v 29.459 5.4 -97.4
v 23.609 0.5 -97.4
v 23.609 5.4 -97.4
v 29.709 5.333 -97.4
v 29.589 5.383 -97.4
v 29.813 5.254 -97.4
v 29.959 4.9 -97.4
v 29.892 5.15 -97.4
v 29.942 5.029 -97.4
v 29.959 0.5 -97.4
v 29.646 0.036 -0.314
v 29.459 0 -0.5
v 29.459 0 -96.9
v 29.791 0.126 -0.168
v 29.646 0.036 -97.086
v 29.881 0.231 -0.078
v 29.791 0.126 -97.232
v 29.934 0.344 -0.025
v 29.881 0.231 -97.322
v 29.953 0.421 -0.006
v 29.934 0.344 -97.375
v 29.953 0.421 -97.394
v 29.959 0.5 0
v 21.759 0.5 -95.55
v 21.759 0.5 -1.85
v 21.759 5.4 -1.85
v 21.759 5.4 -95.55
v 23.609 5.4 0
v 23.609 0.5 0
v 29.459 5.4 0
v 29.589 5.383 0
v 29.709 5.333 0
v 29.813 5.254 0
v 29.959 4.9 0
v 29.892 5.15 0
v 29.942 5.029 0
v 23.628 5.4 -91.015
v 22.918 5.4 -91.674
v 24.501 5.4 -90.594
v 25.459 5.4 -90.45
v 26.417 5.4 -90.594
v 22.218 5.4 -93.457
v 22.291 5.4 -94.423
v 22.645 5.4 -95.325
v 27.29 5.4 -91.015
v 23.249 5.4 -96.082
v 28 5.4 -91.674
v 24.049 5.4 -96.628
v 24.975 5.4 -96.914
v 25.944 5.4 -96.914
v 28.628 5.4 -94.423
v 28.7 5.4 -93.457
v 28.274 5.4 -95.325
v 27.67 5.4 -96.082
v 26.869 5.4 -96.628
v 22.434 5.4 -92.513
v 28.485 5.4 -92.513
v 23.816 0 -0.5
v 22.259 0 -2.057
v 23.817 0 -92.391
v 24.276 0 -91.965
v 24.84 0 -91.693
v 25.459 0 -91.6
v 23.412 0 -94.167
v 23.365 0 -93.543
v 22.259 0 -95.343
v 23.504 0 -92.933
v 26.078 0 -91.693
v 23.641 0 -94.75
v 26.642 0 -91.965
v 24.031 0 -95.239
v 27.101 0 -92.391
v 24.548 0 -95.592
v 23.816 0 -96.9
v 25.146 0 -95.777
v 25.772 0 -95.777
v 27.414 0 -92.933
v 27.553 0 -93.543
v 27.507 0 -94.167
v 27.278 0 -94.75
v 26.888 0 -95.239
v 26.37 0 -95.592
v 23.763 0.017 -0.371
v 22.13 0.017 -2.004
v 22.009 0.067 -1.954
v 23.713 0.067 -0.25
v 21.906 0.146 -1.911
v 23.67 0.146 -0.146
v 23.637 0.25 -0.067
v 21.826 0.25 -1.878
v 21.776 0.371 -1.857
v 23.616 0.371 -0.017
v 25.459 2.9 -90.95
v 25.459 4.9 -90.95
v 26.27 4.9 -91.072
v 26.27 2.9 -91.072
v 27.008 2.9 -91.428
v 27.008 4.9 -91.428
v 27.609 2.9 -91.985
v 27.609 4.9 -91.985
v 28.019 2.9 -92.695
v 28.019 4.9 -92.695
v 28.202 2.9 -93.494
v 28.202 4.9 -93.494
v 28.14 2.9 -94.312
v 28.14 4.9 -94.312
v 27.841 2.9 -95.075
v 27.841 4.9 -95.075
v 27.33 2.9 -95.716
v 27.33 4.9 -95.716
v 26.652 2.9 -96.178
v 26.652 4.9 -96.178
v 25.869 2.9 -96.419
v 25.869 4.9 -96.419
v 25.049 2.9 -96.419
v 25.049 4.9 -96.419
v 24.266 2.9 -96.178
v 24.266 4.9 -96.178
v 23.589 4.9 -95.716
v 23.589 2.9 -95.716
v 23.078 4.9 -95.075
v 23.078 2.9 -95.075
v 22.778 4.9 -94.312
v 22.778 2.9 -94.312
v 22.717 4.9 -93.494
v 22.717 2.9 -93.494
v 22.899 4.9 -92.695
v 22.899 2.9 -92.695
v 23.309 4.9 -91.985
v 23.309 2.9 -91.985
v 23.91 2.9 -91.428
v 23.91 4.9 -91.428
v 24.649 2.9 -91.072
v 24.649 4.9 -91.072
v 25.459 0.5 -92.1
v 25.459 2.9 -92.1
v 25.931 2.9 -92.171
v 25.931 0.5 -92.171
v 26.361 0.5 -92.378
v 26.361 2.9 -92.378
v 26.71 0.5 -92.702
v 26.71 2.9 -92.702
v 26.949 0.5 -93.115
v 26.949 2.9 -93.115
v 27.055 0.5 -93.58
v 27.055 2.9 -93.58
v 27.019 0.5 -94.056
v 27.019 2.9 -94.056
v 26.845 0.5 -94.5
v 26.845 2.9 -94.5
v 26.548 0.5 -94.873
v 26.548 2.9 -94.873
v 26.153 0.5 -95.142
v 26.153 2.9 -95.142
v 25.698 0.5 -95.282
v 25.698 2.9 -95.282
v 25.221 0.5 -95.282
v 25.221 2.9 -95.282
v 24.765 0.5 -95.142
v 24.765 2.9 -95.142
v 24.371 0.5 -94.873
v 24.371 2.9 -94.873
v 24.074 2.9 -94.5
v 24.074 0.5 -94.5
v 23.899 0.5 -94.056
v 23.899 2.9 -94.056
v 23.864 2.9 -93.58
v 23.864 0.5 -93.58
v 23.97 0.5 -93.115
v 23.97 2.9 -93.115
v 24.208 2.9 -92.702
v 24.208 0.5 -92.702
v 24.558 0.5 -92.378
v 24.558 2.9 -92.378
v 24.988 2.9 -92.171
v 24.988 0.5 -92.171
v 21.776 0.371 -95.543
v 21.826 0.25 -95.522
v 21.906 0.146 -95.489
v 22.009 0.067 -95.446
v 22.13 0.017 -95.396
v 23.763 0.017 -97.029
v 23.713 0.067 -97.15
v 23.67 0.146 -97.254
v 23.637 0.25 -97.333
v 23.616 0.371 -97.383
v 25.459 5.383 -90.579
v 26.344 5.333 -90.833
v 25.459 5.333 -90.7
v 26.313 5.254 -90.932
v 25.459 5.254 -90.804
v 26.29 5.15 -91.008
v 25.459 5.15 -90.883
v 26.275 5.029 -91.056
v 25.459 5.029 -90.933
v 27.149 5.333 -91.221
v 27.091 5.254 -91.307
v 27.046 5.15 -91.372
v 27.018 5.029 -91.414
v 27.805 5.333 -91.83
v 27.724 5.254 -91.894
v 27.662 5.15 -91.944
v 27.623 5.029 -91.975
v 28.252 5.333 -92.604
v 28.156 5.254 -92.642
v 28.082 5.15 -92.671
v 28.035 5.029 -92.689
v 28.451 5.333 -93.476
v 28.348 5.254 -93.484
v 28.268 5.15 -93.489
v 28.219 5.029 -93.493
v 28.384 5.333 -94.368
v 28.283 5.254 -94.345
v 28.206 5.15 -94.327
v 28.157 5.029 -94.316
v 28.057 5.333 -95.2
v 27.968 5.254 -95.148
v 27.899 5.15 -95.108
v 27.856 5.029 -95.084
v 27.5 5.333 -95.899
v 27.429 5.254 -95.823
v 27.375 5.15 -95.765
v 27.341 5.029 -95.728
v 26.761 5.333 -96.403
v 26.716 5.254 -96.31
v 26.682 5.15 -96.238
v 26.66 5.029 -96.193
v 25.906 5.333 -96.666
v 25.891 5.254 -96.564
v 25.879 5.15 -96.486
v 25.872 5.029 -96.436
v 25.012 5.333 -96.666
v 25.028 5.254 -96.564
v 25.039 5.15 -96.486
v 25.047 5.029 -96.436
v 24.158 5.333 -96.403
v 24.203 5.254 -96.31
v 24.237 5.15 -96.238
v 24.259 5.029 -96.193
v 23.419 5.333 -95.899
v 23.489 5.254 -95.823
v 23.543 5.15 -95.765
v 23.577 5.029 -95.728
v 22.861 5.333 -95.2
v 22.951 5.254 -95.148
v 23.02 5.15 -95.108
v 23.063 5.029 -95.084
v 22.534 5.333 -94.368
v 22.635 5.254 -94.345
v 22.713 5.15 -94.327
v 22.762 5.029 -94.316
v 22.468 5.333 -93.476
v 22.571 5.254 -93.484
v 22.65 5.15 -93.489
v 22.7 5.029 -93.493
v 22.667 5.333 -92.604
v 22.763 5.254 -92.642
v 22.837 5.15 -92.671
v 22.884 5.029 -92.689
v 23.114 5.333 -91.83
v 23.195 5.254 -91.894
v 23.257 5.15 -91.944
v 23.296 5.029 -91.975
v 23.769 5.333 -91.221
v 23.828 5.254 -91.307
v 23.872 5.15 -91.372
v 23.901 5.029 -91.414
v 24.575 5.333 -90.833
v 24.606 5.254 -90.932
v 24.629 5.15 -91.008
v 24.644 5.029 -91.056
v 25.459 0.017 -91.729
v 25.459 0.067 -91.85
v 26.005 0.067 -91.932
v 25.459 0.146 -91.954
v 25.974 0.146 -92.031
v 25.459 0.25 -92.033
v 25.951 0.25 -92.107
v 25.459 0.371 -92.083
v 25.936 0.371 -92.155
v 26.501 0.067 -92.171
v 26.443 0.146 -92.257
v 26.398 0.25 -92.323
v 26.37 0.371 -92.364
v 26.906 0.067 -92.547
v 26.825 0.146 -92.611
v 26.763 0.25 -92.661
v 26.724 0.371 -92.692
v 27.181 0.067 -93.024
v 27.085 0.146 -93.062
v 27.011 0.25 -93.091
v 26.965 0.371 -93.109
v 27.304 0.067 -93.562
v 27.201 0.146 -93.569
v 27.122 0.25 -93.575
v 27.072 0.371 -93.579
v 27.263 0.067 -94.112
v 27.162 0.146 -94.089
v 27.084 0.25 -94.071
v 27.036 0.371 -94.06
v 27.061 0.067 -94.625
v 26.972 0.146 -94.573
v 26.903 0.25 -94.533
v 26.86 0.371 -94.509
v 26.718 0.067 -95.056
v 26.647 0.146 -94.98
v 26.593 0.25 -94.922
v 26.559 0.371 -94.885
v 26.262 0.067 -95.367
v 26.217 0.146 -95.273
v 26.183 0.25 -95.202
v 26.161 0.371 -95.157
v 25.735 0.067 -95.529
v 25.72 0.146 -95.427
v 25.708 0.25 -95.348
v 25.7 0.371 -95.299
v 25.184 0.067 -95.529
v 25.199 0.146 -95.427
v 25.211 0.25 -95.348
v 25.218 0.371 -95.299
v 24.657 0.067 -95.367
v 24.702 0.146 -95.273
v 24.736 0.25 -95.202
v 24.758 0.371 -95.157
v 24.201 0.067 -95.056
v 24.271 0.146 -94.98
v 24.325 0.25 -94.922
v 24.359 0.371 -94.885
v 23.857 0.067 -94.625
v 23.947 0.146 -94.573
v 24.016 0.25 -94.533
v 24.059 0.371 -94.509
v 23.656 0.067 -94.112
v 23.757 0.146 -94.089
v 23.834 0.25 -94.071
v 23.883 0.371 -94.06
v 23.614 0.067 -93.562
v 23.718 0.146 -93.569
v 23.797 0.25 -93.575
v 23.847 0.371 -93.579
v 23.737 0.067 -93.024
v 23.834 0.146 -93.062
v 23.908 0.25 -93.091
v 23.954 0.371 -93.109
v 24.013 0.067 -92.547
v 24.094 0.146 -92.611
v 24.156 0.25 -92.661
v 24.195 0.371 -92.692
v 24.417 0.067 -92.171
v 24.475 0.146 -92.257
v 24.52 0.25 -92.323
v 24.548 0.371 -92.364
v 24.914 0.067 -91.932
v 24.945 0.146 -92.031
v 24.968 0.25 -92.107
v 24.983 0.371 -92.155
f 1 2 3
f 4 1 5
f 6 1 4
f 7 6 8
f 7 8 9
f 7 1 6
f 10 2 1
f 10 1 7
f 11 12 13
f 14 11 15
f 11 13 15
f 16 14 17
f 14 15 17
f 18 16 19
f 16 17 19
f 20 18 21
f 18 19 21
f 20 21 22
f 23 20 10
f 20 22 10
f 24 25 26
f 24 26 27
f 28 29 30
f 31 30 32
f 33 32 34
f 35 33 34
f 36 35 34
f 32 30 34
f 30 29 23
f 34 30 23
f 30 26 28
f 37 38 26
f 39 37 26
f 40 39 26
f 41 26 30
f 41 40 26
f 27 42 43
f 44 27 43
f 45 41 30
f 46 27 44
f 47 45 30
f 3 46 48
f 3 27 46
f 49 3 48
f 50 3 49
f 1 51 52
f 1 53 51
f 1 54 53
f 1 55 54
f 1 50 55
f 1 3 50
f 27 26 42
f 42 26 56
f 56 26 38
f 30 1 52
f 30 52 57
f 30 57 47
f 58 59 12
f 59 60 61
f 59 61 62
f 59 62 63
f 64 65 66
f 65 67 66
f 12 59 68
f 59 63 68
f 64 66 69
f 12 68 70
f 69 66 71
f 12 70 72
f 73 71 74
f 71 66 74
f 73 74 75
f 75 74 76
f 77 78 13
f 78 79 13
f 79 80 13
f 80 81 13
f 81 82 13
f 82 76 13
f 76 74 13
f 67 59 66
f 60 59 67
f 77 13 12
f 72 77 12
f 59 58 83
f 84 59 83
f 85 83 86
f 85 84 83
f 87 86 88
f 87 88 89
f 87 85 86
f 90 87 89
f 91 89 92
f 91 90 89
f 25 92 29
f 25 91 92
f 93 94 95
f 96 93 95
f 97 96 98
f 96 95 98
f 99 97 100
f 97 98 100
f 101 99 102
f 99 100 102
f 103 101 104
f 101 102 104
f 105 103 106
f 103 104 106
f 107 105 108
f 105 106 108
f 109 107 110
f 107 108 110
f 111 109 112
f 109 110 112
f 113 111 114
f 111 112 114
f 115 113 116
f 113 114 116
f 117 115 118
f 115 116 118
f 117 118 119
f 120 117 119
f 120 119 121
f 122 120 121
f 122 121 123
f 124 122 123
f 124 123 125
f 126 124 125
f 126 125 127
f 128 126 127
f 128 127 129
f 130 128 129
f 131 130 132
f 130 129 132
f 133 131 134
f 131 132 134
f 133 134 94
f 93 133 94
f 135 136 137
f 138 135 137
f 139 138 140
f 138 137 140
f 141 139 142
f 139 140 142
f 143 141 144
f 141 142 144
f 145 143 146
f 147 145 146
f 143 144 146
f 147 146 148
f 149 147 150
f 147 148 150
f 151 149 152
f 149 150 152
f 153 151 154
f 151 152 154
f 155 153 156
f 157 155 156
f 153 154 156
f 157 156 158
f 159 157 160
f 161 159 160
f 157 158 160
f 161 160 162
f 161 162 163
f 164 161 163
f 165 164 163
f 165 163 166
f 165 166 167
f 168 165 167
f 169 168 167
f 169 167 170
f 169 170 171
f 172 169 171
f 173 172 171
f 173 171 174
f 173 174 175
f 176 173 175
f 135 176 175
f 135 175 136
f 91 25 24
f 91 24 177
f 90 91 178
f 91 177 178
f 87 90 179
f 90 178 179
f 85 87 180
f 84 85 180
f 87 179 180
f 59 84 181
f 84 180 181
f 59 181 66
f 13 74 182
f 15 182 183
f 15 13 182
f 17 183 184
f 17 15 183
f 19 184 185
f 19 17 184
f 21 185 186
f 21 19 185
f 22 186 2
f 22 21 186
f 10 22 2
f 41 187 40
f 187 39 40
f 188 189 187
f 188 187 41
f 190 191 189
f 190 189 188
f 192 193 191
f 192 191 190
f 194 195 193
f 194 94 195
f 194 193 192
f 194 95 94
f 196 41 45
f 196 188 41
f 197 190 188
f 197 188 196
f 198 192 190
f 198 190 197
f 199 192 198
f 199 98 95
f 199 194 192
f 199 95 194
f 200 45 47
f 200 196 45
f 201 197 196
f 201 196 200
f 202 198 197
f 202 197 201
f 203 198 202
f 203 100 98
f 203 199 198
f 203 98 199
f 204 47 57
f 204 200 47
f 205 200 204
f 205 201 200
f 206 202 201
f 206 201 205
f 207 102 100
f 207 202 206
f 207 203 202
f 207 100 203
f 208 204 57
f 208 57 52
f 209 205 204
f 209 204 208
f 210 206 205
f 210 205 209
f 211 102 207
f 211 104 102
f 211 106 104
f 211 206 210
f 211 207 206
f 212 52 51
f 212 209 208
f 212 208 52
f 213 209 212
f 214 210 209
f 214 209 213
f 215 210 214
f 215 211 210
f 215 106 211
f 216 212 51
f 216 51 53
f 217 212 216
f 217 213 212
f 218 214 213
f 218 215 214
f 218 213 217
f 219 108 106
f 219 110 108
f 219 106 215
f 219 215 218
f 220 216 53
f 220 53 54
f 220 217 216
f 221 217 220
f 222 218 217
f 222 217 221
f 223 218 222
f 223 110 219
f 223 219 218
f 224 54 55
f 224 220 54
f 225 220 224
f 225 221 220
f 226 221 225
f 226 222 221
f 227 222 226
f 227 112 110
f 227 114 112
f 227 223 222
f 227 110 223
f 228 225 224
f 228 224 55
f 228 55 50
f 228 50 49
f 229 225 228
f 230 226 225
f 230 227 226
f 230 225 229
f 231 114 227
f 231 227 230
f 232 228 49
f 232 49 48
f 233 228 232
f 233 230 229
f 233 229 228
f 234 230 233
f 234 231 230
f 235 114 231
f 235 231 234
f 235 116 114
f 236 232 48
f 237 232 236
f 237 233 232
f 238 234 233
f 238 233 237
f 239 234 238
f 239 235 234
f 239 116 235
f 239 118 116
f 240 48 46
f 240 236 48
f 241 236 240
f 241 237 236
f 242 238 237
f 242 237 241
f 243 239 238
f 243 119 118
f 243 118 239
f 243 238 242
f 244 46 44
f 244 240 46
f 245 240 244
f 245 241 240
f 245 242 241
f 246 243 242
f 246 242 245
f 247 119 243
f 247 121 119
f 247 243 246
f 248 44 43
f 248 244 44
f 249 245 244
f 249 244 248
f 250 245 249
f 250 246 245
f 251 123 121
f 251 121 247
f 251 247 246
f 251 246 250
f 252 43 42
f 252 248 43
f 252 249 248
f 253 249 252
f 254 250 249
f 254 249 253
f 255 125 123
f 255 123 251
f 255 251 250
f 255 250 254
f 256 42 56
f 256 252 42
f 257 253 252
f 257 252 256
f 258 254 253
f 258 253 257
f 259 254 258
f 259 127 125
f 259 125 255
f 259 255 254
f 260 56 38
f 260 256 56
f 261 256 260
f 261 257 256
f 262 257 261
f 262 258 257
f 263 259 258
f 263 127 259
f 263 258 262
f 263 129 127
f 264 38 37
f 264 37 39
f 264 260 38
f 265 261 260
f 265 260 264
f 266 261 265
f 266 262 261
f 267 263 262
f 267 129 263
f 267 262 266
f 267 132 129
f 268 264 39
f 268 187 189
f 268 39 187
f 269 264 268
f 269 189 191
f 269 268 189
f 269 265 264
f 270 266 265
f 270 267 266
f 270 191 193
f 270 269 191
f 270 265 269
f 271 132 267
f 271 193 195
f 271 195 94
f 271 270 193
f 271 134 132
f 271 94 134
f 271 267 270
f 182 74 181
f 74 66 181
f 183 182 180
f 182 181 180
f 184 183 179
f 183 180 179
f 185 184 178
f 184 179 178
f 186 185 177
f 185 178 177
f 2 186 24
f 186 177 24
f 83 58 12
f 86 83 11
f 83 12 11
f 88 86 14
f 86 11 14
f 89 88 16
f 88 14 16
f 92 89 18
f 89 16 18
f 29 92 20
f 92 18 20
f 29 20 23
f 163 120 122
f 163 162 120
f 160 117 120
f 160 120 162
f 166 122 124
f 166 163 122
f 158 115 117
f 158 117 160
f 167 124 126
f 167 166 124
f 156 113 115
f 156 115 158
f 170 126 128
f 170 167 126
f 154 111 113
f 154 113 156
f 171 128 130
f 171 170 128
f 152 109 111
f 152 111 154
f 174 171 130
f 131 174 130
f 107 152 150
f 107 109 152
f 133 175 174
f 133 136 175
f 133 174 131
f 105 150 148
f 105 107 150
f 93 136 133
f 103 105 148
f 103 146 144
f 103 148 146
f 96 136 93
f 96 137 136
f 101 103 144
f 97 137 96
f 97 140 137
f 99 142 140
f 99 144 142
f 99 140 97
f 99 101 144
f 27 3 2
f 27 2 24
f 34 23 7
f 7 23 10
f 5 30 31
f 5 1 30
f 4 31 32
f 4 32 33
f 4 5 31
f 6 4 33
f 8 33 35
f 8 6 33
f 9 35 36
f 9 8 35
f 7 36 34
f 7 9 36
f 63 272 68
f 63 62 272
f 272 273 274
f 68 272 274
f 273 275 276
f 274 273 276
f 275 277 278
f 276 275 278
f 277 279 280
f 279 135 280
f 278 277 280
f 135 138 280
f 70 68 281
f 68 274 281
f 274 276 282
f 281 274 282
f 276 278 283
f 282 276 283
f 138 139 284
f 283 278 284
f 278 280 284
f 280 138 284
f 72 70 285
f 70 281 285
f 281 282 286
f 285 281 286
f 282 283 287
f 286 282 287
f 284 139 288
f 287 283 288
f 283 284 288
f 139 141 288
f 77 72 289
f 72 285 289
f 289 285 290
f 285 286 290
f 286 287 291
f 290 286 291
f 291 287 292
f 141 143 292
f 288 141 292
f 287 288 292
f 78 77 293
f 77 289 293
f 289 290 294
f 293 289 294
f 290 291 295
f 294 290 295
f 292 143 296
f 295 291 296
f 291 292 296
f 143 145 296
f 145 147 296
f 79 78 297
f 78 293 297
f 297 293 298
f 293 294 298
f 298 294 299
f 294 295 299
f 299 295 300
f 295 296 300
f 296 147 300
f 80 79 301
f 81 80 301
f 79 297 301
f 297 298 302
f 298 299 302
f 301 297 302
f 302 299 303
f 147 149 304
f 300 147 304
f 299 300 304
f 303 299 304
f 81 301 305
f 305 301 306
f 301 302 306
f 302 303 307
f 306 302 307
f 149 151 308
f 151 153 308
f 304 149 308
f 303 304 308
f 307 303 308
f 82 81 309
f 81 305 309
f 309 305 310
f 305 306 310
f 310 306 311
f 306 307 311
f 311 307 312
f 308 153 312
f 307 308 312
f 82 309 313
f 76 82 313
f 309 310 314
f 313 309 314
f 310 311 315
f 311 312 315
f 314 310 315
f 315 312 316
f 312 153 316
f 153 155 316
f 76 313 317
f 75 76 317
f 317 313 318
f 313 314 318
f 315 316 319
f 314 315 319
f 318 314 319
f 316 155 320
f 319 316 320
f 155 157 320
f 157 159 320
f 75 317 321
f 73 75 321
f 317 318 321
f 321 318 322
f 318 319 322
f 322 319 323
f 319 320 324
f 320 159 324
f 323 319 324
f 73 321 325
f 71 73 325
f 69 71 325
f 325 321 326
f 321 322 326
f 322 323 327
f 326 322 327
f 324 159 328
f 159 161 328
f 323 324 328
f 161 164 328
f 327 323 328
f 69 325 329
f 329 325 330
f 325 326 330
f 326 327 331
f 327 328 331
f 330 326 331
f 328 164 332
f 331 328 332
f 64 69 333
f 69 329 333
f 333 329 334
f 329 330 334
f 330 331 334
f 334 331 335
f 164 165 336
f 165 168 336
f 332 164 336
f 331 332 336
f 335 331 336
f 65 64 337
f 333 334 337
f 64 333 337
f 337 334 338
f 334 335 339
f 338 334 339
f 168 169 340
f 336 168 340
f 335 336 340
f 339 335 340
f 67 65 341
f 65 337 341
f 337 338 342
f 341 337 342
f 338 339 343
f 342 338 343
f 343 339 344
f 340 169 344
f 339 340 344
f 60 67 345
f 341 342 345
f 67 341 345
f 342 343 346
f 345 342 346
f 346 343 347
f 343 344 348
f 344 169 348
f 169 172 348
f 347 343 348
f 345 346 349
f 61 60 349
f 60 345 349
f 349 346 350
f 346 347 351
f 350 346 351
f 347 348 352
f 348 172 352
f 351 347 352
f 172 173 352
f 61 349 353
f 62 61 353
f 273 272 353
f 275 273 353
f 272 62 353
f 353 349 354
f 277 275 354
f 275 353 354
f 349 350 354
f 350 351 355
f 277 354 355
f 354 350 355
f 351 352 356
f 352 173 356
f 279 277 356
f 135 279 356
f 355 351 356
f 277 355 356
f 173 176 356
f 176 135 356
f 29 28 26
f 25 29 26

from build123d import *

# Parameters (mm, degrees)
SKETCH_1_W          = 8.2
SKETCH_1_H          = 97.4
EXTRUDE_1_DEPTH     = 5.4
SKETCH_2_R          = 1.6
CUT_EXTRUDE_1_DEPTH = 103.046451594
FILLET_1_R          = 0.5
FILLET_2_R          = 0.5
SKETCH_3_R          = 2.75
CUT_EXTRUDE_2_DEPTH = 2.5
FILLET_3_R          = 0.5


with BuildPart() as part:
    # 草图1 → 凸台-拉伸1 (new body)
    with BuildSketch(Plane(origin=(0, 0, 0), x_dir=(1, 0, 0), z_dir=(0, 1, 0))):
        with Locations((25.859277076, 48.7)):
            Rectangle(SKETCH_1_W, SKETCH_1_H)
    extrude(amount=EXTRUDE_1_DEPTH)

    # 草图2 → 切除-拉伸1 (cut, through all)
    with BuildSketch(Plane(origin=(0, 5.4, 0), x_dir=(1, 0, 0), z_dir=(0, 1, 0))):
        with Locations(Location((25.459277076, 93.7, 0), (0, 0, 270))):
            Circle(SKETCH_2_R)
        Polygon((21.759277076, 97.4), (23.609277076, 97.4), (21.759277076, 95.55), align=None)
        Polygon((21.759277076, 0), (23.609277076, 0), (21.759277076, 1.85), align=None)
    extrude(amount=-CUT_EXTRUDE_1_DEPTH, mode=Mode.SUBTRACT)

    # 圆角1
    fillet_1_edges = [part.edges().sort_by_distance(p)[0] for p in [
        (21.759277076, 0, -48.7),
        (26.784277076, 0, 0),
        (22.684277076, 0, -96.475),
        (22.684277076, 0, -0.925),
        (25.459277076, 0, -95.3),
        (26.784277076, 0, -97.4),
        (29.959277076, 0, -48.7),
    ]]
    fillet(fillet_1_edges, radius=FILLET_1_R)

    # 圆角2
    fillet_2_edges = [part.edges().sort_by_distance(p)[0] for p in [
        (29.959277076, 5.4, -48.7),
    ]]
    fillet(fillet_2_edges, radius=FILLET_2_R)

    # 草图3 → 切除-拉伸2 (cut)
    with BuildSketch(Plane(origin=(0, 5.4, 0), x_dir=(1, 0, 0), z_dir=(0, 1, 0))):
        with Locations(Location((25.459277076, 93.7, 0), (0, 0, 270))):
            Circle(SKETCH_3_R)
    extrude(amount=-CUT_EXTRUDE_2_DEPTH, mode=Mode.SUBTRACT)

    # 圆角3
    fillet_3_edges = [part.edges().sort_by_distance(p)[0] for p in [
        (25.459277076, 5.4, -96.45),
    ]]
    fillet(fillet_3_edges, radius=FILLET_3_R)


solid = part.part
